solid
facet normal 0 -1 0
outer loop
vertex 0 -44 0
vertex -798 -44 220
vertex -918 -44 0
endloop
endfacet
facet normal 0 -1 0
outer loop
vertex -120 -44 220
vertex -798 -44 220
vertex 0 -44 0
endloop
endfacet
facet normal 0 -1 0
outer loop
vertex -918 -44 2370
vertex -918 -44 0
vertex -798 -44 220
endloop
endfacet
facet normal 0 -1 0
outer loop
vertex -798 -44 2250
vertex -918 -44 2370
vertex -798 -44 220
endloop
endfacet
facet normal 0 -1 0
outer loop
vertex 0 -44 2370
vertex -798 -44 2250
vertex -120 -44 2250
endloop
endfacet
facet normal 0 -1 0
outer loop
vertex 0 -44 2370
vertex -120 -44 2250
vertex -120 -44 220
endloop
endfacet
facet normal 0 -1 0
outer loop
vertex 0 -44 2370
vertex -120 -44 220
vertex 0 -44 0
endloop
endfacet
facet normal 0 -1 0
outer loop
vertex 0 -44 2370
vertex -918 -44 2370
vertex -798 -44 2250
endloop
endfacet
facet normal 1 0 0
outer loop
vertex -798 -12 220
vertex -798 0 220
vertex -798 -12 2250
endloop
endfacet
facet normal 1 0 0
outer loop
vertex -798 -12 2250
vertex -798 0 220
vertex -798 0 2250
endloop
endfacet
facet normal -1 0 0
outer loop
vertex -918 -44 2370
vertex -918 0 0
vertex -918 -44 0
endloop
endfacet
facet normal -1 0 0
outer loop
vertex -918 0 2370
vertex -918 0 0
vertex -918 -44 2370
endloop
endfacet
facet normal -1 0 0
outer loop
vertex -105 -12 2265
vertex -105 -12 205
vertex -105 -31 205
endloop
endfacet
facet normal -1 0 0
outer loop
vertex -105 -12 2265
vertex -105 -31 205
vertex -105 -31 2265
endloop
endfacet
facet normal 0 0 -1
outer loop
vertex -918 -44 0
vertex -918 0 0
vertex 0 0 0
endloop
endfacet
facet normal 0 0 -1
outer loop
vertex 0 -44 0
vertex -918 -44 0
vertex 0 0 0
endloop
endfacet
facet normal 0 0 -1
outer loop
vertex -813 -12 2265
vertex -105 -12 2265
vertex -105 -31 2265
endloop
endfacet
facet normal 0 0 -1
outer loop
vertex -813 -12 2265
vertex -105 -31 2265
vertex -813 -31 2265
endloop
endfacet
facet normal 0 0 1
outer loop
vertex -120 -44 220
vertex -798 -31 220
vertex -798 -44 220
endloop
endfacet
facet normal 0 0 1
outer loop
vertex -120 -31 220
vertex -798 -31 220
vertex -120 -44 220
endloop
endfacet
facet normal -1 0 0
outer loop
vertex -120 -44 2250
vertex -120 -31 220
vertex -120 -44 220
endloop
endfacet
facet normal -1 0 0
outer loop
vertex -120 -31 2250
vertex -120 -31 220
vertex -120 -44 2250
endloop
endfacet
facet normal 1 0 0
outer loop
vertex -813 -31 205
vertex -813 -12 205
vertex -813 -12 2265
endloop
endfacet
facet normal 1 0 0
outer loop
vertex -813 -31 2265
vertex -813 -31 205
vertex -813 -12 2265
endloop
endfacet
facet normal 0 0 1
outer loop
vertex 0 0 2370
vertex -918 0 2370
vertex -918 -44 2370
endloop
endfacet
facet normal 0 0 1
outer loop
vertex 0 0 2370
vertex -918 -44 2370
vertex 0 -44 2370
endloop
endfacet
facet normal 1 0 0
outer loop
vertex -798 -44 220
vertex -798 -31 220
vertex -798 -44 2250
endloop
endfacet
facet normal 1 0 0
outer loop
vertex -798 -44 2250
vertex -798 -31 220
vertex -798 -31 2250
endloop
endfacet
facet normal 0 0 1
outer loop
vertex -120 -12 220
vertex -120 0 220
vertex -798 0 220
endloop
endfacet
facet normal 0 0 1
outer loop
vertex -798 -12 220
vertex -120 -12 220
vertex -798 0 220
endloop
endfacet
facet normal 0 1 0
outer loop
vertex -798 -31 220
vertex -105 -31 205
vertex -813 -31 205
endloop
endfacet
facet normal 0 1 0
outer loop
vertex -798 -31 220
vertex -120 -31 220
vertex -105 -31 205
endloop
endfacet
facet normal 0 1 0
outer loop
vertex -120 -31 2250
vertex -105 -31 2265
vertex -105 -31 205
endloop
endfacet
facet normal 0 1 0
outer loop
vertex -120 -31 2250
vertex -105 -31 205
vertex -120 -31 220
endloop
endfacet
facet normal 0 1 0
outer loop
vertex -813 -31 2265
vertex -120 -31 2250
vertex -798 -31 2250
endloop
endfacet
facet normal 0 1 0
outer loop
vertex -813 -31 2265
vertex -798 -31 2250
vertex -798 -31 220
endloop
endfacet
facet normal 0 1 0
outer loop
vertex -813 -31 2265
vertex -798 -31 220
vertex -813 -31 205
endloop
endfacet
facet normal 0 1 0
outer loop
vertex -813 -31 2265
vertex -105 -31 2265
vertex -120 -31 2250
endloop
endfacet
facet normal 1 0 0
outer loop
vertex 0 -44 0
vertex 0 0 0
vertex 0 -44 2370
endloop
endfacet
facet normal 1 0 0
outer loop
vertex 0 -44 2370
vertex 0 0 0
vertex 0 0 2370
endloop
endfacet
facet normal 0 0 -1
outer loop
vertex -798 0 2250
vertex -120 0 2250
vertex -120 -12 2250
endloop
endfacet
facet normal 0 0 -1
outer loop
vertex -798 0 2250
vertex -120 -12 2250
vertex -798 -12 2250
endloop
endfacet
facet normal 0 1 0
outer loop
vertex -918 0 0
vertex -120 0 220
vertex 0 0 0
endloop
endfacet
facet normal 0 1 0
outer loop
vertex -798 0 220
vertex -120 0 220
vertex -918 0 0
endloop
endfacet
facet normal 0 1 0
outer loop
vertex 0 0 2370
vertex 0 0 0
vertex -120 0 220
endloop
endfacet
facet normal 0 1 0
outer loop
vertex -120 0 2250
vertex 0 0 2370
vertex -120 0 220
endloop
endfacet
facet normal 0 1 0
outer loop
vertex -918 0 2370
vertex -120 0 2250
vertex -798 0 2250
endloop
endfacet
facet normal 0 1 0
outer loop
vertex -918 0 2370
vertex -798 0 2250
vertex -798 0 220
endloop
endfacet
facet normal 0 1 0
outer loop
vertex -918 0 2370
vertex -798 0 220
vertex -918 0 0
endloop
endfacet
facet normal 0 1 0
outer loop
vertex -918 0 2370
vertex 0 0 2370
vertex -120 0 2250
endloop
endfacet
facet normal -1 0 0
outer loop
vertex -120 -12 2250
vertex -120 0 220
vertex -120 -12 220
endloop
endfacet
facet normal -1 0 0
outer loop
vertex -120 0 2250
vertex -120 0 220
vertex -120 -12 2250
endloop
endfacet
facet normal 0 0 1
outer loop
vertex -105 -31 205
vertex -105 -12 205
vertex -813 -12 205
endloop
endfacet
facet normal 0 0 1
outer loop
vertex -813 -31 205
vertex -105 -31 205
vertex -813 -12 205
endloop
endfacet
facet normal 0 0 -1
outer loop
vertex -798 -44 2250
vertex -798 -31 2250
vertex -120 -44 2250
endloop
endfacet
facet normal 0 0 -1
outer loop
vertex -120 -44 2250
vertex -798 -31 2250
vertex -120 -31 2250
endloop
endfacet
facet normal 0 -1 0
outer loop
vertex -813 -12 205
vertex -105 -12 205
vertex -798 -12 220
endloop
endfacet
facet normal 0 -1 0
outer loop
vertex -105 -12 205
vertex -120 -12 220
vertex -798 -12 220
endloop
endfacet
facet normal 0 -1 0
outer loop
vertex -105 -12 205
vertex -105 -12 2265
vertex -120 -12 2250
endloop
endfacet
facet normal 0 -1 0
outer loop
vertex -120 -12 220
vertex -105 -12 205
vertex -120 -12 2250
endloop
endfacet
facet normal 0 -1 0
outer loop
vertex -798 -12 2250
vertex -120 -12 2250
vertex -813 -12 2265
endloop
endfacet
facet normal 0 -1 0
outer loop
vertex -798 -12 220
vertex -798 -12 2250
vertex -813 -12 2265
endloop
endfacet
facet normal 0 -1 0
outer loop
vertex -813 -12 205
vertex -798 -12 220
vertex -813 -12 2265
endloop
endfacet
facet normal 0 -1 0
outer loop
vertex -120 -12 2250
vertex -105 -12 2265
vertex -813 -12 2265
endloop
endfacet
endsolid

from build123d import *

# Parameters (mm, degrees)
F0_W     = 918
F0_H     = 2370
F0_W_2   = 678
F0_H_2   = 2030
F1_DEPTH = 44
F2_W     = 708
F2_H     = 2060
F2_W_2   = 678
F2_H_2   = 2030
F3_DEPTH = 31
F4_W     = 708
F4_H     = 2060
F4_W_2   = 678
F4_H_2   = 2030
F5_DEPTH = 12


with BuildPart() as f1:
    # F0 (on Front) → F1 (new body)
    with BuildSketch(Plane.XZ):
        with Locations((-459, 1185)):
            Rectangle(F0_W, F0_H)
        with Locations((-459, 1235)):
            Rectangle(F0_W_2, F0_H_2, mode=Mode.SUBTRACT)
    extrude(amount=F1_DEPTH)

    # F2 (on face) → F3 (cut)
    with BuildSketch(Plane(origin=(0, 0, 0), x_dir=(-1, 0, 0), z_dir=(0, 1, 0))):
        with Locations((459, 1235)):
            Rectangle(F2_W, F2_H)
        with Locations((459, 1235)):
            Rectangle(F2_W_2, F2_H_2, mode=Mode.SUBTRACT)
    extrude(amount=-F3_DEPTH, mode=Mode.SUBTRACT)

    # F4 (on face) → F5 (join)
    with BuildSketch(Plane(origin=(0, 0, 0), x_dir=(-1, 0, 0), z_dir=(0, 1, 0))):
        with Locations((459, 1235)):
            Rectangle(F4_W, F4_H)
        with Locations((459, 1235)):
            Rectangle(F4_W_2, F4_H_2, mode=Mode.SUBTRACT)
    extrude(amount=-F5_DEPTH)


solid = f1.part
